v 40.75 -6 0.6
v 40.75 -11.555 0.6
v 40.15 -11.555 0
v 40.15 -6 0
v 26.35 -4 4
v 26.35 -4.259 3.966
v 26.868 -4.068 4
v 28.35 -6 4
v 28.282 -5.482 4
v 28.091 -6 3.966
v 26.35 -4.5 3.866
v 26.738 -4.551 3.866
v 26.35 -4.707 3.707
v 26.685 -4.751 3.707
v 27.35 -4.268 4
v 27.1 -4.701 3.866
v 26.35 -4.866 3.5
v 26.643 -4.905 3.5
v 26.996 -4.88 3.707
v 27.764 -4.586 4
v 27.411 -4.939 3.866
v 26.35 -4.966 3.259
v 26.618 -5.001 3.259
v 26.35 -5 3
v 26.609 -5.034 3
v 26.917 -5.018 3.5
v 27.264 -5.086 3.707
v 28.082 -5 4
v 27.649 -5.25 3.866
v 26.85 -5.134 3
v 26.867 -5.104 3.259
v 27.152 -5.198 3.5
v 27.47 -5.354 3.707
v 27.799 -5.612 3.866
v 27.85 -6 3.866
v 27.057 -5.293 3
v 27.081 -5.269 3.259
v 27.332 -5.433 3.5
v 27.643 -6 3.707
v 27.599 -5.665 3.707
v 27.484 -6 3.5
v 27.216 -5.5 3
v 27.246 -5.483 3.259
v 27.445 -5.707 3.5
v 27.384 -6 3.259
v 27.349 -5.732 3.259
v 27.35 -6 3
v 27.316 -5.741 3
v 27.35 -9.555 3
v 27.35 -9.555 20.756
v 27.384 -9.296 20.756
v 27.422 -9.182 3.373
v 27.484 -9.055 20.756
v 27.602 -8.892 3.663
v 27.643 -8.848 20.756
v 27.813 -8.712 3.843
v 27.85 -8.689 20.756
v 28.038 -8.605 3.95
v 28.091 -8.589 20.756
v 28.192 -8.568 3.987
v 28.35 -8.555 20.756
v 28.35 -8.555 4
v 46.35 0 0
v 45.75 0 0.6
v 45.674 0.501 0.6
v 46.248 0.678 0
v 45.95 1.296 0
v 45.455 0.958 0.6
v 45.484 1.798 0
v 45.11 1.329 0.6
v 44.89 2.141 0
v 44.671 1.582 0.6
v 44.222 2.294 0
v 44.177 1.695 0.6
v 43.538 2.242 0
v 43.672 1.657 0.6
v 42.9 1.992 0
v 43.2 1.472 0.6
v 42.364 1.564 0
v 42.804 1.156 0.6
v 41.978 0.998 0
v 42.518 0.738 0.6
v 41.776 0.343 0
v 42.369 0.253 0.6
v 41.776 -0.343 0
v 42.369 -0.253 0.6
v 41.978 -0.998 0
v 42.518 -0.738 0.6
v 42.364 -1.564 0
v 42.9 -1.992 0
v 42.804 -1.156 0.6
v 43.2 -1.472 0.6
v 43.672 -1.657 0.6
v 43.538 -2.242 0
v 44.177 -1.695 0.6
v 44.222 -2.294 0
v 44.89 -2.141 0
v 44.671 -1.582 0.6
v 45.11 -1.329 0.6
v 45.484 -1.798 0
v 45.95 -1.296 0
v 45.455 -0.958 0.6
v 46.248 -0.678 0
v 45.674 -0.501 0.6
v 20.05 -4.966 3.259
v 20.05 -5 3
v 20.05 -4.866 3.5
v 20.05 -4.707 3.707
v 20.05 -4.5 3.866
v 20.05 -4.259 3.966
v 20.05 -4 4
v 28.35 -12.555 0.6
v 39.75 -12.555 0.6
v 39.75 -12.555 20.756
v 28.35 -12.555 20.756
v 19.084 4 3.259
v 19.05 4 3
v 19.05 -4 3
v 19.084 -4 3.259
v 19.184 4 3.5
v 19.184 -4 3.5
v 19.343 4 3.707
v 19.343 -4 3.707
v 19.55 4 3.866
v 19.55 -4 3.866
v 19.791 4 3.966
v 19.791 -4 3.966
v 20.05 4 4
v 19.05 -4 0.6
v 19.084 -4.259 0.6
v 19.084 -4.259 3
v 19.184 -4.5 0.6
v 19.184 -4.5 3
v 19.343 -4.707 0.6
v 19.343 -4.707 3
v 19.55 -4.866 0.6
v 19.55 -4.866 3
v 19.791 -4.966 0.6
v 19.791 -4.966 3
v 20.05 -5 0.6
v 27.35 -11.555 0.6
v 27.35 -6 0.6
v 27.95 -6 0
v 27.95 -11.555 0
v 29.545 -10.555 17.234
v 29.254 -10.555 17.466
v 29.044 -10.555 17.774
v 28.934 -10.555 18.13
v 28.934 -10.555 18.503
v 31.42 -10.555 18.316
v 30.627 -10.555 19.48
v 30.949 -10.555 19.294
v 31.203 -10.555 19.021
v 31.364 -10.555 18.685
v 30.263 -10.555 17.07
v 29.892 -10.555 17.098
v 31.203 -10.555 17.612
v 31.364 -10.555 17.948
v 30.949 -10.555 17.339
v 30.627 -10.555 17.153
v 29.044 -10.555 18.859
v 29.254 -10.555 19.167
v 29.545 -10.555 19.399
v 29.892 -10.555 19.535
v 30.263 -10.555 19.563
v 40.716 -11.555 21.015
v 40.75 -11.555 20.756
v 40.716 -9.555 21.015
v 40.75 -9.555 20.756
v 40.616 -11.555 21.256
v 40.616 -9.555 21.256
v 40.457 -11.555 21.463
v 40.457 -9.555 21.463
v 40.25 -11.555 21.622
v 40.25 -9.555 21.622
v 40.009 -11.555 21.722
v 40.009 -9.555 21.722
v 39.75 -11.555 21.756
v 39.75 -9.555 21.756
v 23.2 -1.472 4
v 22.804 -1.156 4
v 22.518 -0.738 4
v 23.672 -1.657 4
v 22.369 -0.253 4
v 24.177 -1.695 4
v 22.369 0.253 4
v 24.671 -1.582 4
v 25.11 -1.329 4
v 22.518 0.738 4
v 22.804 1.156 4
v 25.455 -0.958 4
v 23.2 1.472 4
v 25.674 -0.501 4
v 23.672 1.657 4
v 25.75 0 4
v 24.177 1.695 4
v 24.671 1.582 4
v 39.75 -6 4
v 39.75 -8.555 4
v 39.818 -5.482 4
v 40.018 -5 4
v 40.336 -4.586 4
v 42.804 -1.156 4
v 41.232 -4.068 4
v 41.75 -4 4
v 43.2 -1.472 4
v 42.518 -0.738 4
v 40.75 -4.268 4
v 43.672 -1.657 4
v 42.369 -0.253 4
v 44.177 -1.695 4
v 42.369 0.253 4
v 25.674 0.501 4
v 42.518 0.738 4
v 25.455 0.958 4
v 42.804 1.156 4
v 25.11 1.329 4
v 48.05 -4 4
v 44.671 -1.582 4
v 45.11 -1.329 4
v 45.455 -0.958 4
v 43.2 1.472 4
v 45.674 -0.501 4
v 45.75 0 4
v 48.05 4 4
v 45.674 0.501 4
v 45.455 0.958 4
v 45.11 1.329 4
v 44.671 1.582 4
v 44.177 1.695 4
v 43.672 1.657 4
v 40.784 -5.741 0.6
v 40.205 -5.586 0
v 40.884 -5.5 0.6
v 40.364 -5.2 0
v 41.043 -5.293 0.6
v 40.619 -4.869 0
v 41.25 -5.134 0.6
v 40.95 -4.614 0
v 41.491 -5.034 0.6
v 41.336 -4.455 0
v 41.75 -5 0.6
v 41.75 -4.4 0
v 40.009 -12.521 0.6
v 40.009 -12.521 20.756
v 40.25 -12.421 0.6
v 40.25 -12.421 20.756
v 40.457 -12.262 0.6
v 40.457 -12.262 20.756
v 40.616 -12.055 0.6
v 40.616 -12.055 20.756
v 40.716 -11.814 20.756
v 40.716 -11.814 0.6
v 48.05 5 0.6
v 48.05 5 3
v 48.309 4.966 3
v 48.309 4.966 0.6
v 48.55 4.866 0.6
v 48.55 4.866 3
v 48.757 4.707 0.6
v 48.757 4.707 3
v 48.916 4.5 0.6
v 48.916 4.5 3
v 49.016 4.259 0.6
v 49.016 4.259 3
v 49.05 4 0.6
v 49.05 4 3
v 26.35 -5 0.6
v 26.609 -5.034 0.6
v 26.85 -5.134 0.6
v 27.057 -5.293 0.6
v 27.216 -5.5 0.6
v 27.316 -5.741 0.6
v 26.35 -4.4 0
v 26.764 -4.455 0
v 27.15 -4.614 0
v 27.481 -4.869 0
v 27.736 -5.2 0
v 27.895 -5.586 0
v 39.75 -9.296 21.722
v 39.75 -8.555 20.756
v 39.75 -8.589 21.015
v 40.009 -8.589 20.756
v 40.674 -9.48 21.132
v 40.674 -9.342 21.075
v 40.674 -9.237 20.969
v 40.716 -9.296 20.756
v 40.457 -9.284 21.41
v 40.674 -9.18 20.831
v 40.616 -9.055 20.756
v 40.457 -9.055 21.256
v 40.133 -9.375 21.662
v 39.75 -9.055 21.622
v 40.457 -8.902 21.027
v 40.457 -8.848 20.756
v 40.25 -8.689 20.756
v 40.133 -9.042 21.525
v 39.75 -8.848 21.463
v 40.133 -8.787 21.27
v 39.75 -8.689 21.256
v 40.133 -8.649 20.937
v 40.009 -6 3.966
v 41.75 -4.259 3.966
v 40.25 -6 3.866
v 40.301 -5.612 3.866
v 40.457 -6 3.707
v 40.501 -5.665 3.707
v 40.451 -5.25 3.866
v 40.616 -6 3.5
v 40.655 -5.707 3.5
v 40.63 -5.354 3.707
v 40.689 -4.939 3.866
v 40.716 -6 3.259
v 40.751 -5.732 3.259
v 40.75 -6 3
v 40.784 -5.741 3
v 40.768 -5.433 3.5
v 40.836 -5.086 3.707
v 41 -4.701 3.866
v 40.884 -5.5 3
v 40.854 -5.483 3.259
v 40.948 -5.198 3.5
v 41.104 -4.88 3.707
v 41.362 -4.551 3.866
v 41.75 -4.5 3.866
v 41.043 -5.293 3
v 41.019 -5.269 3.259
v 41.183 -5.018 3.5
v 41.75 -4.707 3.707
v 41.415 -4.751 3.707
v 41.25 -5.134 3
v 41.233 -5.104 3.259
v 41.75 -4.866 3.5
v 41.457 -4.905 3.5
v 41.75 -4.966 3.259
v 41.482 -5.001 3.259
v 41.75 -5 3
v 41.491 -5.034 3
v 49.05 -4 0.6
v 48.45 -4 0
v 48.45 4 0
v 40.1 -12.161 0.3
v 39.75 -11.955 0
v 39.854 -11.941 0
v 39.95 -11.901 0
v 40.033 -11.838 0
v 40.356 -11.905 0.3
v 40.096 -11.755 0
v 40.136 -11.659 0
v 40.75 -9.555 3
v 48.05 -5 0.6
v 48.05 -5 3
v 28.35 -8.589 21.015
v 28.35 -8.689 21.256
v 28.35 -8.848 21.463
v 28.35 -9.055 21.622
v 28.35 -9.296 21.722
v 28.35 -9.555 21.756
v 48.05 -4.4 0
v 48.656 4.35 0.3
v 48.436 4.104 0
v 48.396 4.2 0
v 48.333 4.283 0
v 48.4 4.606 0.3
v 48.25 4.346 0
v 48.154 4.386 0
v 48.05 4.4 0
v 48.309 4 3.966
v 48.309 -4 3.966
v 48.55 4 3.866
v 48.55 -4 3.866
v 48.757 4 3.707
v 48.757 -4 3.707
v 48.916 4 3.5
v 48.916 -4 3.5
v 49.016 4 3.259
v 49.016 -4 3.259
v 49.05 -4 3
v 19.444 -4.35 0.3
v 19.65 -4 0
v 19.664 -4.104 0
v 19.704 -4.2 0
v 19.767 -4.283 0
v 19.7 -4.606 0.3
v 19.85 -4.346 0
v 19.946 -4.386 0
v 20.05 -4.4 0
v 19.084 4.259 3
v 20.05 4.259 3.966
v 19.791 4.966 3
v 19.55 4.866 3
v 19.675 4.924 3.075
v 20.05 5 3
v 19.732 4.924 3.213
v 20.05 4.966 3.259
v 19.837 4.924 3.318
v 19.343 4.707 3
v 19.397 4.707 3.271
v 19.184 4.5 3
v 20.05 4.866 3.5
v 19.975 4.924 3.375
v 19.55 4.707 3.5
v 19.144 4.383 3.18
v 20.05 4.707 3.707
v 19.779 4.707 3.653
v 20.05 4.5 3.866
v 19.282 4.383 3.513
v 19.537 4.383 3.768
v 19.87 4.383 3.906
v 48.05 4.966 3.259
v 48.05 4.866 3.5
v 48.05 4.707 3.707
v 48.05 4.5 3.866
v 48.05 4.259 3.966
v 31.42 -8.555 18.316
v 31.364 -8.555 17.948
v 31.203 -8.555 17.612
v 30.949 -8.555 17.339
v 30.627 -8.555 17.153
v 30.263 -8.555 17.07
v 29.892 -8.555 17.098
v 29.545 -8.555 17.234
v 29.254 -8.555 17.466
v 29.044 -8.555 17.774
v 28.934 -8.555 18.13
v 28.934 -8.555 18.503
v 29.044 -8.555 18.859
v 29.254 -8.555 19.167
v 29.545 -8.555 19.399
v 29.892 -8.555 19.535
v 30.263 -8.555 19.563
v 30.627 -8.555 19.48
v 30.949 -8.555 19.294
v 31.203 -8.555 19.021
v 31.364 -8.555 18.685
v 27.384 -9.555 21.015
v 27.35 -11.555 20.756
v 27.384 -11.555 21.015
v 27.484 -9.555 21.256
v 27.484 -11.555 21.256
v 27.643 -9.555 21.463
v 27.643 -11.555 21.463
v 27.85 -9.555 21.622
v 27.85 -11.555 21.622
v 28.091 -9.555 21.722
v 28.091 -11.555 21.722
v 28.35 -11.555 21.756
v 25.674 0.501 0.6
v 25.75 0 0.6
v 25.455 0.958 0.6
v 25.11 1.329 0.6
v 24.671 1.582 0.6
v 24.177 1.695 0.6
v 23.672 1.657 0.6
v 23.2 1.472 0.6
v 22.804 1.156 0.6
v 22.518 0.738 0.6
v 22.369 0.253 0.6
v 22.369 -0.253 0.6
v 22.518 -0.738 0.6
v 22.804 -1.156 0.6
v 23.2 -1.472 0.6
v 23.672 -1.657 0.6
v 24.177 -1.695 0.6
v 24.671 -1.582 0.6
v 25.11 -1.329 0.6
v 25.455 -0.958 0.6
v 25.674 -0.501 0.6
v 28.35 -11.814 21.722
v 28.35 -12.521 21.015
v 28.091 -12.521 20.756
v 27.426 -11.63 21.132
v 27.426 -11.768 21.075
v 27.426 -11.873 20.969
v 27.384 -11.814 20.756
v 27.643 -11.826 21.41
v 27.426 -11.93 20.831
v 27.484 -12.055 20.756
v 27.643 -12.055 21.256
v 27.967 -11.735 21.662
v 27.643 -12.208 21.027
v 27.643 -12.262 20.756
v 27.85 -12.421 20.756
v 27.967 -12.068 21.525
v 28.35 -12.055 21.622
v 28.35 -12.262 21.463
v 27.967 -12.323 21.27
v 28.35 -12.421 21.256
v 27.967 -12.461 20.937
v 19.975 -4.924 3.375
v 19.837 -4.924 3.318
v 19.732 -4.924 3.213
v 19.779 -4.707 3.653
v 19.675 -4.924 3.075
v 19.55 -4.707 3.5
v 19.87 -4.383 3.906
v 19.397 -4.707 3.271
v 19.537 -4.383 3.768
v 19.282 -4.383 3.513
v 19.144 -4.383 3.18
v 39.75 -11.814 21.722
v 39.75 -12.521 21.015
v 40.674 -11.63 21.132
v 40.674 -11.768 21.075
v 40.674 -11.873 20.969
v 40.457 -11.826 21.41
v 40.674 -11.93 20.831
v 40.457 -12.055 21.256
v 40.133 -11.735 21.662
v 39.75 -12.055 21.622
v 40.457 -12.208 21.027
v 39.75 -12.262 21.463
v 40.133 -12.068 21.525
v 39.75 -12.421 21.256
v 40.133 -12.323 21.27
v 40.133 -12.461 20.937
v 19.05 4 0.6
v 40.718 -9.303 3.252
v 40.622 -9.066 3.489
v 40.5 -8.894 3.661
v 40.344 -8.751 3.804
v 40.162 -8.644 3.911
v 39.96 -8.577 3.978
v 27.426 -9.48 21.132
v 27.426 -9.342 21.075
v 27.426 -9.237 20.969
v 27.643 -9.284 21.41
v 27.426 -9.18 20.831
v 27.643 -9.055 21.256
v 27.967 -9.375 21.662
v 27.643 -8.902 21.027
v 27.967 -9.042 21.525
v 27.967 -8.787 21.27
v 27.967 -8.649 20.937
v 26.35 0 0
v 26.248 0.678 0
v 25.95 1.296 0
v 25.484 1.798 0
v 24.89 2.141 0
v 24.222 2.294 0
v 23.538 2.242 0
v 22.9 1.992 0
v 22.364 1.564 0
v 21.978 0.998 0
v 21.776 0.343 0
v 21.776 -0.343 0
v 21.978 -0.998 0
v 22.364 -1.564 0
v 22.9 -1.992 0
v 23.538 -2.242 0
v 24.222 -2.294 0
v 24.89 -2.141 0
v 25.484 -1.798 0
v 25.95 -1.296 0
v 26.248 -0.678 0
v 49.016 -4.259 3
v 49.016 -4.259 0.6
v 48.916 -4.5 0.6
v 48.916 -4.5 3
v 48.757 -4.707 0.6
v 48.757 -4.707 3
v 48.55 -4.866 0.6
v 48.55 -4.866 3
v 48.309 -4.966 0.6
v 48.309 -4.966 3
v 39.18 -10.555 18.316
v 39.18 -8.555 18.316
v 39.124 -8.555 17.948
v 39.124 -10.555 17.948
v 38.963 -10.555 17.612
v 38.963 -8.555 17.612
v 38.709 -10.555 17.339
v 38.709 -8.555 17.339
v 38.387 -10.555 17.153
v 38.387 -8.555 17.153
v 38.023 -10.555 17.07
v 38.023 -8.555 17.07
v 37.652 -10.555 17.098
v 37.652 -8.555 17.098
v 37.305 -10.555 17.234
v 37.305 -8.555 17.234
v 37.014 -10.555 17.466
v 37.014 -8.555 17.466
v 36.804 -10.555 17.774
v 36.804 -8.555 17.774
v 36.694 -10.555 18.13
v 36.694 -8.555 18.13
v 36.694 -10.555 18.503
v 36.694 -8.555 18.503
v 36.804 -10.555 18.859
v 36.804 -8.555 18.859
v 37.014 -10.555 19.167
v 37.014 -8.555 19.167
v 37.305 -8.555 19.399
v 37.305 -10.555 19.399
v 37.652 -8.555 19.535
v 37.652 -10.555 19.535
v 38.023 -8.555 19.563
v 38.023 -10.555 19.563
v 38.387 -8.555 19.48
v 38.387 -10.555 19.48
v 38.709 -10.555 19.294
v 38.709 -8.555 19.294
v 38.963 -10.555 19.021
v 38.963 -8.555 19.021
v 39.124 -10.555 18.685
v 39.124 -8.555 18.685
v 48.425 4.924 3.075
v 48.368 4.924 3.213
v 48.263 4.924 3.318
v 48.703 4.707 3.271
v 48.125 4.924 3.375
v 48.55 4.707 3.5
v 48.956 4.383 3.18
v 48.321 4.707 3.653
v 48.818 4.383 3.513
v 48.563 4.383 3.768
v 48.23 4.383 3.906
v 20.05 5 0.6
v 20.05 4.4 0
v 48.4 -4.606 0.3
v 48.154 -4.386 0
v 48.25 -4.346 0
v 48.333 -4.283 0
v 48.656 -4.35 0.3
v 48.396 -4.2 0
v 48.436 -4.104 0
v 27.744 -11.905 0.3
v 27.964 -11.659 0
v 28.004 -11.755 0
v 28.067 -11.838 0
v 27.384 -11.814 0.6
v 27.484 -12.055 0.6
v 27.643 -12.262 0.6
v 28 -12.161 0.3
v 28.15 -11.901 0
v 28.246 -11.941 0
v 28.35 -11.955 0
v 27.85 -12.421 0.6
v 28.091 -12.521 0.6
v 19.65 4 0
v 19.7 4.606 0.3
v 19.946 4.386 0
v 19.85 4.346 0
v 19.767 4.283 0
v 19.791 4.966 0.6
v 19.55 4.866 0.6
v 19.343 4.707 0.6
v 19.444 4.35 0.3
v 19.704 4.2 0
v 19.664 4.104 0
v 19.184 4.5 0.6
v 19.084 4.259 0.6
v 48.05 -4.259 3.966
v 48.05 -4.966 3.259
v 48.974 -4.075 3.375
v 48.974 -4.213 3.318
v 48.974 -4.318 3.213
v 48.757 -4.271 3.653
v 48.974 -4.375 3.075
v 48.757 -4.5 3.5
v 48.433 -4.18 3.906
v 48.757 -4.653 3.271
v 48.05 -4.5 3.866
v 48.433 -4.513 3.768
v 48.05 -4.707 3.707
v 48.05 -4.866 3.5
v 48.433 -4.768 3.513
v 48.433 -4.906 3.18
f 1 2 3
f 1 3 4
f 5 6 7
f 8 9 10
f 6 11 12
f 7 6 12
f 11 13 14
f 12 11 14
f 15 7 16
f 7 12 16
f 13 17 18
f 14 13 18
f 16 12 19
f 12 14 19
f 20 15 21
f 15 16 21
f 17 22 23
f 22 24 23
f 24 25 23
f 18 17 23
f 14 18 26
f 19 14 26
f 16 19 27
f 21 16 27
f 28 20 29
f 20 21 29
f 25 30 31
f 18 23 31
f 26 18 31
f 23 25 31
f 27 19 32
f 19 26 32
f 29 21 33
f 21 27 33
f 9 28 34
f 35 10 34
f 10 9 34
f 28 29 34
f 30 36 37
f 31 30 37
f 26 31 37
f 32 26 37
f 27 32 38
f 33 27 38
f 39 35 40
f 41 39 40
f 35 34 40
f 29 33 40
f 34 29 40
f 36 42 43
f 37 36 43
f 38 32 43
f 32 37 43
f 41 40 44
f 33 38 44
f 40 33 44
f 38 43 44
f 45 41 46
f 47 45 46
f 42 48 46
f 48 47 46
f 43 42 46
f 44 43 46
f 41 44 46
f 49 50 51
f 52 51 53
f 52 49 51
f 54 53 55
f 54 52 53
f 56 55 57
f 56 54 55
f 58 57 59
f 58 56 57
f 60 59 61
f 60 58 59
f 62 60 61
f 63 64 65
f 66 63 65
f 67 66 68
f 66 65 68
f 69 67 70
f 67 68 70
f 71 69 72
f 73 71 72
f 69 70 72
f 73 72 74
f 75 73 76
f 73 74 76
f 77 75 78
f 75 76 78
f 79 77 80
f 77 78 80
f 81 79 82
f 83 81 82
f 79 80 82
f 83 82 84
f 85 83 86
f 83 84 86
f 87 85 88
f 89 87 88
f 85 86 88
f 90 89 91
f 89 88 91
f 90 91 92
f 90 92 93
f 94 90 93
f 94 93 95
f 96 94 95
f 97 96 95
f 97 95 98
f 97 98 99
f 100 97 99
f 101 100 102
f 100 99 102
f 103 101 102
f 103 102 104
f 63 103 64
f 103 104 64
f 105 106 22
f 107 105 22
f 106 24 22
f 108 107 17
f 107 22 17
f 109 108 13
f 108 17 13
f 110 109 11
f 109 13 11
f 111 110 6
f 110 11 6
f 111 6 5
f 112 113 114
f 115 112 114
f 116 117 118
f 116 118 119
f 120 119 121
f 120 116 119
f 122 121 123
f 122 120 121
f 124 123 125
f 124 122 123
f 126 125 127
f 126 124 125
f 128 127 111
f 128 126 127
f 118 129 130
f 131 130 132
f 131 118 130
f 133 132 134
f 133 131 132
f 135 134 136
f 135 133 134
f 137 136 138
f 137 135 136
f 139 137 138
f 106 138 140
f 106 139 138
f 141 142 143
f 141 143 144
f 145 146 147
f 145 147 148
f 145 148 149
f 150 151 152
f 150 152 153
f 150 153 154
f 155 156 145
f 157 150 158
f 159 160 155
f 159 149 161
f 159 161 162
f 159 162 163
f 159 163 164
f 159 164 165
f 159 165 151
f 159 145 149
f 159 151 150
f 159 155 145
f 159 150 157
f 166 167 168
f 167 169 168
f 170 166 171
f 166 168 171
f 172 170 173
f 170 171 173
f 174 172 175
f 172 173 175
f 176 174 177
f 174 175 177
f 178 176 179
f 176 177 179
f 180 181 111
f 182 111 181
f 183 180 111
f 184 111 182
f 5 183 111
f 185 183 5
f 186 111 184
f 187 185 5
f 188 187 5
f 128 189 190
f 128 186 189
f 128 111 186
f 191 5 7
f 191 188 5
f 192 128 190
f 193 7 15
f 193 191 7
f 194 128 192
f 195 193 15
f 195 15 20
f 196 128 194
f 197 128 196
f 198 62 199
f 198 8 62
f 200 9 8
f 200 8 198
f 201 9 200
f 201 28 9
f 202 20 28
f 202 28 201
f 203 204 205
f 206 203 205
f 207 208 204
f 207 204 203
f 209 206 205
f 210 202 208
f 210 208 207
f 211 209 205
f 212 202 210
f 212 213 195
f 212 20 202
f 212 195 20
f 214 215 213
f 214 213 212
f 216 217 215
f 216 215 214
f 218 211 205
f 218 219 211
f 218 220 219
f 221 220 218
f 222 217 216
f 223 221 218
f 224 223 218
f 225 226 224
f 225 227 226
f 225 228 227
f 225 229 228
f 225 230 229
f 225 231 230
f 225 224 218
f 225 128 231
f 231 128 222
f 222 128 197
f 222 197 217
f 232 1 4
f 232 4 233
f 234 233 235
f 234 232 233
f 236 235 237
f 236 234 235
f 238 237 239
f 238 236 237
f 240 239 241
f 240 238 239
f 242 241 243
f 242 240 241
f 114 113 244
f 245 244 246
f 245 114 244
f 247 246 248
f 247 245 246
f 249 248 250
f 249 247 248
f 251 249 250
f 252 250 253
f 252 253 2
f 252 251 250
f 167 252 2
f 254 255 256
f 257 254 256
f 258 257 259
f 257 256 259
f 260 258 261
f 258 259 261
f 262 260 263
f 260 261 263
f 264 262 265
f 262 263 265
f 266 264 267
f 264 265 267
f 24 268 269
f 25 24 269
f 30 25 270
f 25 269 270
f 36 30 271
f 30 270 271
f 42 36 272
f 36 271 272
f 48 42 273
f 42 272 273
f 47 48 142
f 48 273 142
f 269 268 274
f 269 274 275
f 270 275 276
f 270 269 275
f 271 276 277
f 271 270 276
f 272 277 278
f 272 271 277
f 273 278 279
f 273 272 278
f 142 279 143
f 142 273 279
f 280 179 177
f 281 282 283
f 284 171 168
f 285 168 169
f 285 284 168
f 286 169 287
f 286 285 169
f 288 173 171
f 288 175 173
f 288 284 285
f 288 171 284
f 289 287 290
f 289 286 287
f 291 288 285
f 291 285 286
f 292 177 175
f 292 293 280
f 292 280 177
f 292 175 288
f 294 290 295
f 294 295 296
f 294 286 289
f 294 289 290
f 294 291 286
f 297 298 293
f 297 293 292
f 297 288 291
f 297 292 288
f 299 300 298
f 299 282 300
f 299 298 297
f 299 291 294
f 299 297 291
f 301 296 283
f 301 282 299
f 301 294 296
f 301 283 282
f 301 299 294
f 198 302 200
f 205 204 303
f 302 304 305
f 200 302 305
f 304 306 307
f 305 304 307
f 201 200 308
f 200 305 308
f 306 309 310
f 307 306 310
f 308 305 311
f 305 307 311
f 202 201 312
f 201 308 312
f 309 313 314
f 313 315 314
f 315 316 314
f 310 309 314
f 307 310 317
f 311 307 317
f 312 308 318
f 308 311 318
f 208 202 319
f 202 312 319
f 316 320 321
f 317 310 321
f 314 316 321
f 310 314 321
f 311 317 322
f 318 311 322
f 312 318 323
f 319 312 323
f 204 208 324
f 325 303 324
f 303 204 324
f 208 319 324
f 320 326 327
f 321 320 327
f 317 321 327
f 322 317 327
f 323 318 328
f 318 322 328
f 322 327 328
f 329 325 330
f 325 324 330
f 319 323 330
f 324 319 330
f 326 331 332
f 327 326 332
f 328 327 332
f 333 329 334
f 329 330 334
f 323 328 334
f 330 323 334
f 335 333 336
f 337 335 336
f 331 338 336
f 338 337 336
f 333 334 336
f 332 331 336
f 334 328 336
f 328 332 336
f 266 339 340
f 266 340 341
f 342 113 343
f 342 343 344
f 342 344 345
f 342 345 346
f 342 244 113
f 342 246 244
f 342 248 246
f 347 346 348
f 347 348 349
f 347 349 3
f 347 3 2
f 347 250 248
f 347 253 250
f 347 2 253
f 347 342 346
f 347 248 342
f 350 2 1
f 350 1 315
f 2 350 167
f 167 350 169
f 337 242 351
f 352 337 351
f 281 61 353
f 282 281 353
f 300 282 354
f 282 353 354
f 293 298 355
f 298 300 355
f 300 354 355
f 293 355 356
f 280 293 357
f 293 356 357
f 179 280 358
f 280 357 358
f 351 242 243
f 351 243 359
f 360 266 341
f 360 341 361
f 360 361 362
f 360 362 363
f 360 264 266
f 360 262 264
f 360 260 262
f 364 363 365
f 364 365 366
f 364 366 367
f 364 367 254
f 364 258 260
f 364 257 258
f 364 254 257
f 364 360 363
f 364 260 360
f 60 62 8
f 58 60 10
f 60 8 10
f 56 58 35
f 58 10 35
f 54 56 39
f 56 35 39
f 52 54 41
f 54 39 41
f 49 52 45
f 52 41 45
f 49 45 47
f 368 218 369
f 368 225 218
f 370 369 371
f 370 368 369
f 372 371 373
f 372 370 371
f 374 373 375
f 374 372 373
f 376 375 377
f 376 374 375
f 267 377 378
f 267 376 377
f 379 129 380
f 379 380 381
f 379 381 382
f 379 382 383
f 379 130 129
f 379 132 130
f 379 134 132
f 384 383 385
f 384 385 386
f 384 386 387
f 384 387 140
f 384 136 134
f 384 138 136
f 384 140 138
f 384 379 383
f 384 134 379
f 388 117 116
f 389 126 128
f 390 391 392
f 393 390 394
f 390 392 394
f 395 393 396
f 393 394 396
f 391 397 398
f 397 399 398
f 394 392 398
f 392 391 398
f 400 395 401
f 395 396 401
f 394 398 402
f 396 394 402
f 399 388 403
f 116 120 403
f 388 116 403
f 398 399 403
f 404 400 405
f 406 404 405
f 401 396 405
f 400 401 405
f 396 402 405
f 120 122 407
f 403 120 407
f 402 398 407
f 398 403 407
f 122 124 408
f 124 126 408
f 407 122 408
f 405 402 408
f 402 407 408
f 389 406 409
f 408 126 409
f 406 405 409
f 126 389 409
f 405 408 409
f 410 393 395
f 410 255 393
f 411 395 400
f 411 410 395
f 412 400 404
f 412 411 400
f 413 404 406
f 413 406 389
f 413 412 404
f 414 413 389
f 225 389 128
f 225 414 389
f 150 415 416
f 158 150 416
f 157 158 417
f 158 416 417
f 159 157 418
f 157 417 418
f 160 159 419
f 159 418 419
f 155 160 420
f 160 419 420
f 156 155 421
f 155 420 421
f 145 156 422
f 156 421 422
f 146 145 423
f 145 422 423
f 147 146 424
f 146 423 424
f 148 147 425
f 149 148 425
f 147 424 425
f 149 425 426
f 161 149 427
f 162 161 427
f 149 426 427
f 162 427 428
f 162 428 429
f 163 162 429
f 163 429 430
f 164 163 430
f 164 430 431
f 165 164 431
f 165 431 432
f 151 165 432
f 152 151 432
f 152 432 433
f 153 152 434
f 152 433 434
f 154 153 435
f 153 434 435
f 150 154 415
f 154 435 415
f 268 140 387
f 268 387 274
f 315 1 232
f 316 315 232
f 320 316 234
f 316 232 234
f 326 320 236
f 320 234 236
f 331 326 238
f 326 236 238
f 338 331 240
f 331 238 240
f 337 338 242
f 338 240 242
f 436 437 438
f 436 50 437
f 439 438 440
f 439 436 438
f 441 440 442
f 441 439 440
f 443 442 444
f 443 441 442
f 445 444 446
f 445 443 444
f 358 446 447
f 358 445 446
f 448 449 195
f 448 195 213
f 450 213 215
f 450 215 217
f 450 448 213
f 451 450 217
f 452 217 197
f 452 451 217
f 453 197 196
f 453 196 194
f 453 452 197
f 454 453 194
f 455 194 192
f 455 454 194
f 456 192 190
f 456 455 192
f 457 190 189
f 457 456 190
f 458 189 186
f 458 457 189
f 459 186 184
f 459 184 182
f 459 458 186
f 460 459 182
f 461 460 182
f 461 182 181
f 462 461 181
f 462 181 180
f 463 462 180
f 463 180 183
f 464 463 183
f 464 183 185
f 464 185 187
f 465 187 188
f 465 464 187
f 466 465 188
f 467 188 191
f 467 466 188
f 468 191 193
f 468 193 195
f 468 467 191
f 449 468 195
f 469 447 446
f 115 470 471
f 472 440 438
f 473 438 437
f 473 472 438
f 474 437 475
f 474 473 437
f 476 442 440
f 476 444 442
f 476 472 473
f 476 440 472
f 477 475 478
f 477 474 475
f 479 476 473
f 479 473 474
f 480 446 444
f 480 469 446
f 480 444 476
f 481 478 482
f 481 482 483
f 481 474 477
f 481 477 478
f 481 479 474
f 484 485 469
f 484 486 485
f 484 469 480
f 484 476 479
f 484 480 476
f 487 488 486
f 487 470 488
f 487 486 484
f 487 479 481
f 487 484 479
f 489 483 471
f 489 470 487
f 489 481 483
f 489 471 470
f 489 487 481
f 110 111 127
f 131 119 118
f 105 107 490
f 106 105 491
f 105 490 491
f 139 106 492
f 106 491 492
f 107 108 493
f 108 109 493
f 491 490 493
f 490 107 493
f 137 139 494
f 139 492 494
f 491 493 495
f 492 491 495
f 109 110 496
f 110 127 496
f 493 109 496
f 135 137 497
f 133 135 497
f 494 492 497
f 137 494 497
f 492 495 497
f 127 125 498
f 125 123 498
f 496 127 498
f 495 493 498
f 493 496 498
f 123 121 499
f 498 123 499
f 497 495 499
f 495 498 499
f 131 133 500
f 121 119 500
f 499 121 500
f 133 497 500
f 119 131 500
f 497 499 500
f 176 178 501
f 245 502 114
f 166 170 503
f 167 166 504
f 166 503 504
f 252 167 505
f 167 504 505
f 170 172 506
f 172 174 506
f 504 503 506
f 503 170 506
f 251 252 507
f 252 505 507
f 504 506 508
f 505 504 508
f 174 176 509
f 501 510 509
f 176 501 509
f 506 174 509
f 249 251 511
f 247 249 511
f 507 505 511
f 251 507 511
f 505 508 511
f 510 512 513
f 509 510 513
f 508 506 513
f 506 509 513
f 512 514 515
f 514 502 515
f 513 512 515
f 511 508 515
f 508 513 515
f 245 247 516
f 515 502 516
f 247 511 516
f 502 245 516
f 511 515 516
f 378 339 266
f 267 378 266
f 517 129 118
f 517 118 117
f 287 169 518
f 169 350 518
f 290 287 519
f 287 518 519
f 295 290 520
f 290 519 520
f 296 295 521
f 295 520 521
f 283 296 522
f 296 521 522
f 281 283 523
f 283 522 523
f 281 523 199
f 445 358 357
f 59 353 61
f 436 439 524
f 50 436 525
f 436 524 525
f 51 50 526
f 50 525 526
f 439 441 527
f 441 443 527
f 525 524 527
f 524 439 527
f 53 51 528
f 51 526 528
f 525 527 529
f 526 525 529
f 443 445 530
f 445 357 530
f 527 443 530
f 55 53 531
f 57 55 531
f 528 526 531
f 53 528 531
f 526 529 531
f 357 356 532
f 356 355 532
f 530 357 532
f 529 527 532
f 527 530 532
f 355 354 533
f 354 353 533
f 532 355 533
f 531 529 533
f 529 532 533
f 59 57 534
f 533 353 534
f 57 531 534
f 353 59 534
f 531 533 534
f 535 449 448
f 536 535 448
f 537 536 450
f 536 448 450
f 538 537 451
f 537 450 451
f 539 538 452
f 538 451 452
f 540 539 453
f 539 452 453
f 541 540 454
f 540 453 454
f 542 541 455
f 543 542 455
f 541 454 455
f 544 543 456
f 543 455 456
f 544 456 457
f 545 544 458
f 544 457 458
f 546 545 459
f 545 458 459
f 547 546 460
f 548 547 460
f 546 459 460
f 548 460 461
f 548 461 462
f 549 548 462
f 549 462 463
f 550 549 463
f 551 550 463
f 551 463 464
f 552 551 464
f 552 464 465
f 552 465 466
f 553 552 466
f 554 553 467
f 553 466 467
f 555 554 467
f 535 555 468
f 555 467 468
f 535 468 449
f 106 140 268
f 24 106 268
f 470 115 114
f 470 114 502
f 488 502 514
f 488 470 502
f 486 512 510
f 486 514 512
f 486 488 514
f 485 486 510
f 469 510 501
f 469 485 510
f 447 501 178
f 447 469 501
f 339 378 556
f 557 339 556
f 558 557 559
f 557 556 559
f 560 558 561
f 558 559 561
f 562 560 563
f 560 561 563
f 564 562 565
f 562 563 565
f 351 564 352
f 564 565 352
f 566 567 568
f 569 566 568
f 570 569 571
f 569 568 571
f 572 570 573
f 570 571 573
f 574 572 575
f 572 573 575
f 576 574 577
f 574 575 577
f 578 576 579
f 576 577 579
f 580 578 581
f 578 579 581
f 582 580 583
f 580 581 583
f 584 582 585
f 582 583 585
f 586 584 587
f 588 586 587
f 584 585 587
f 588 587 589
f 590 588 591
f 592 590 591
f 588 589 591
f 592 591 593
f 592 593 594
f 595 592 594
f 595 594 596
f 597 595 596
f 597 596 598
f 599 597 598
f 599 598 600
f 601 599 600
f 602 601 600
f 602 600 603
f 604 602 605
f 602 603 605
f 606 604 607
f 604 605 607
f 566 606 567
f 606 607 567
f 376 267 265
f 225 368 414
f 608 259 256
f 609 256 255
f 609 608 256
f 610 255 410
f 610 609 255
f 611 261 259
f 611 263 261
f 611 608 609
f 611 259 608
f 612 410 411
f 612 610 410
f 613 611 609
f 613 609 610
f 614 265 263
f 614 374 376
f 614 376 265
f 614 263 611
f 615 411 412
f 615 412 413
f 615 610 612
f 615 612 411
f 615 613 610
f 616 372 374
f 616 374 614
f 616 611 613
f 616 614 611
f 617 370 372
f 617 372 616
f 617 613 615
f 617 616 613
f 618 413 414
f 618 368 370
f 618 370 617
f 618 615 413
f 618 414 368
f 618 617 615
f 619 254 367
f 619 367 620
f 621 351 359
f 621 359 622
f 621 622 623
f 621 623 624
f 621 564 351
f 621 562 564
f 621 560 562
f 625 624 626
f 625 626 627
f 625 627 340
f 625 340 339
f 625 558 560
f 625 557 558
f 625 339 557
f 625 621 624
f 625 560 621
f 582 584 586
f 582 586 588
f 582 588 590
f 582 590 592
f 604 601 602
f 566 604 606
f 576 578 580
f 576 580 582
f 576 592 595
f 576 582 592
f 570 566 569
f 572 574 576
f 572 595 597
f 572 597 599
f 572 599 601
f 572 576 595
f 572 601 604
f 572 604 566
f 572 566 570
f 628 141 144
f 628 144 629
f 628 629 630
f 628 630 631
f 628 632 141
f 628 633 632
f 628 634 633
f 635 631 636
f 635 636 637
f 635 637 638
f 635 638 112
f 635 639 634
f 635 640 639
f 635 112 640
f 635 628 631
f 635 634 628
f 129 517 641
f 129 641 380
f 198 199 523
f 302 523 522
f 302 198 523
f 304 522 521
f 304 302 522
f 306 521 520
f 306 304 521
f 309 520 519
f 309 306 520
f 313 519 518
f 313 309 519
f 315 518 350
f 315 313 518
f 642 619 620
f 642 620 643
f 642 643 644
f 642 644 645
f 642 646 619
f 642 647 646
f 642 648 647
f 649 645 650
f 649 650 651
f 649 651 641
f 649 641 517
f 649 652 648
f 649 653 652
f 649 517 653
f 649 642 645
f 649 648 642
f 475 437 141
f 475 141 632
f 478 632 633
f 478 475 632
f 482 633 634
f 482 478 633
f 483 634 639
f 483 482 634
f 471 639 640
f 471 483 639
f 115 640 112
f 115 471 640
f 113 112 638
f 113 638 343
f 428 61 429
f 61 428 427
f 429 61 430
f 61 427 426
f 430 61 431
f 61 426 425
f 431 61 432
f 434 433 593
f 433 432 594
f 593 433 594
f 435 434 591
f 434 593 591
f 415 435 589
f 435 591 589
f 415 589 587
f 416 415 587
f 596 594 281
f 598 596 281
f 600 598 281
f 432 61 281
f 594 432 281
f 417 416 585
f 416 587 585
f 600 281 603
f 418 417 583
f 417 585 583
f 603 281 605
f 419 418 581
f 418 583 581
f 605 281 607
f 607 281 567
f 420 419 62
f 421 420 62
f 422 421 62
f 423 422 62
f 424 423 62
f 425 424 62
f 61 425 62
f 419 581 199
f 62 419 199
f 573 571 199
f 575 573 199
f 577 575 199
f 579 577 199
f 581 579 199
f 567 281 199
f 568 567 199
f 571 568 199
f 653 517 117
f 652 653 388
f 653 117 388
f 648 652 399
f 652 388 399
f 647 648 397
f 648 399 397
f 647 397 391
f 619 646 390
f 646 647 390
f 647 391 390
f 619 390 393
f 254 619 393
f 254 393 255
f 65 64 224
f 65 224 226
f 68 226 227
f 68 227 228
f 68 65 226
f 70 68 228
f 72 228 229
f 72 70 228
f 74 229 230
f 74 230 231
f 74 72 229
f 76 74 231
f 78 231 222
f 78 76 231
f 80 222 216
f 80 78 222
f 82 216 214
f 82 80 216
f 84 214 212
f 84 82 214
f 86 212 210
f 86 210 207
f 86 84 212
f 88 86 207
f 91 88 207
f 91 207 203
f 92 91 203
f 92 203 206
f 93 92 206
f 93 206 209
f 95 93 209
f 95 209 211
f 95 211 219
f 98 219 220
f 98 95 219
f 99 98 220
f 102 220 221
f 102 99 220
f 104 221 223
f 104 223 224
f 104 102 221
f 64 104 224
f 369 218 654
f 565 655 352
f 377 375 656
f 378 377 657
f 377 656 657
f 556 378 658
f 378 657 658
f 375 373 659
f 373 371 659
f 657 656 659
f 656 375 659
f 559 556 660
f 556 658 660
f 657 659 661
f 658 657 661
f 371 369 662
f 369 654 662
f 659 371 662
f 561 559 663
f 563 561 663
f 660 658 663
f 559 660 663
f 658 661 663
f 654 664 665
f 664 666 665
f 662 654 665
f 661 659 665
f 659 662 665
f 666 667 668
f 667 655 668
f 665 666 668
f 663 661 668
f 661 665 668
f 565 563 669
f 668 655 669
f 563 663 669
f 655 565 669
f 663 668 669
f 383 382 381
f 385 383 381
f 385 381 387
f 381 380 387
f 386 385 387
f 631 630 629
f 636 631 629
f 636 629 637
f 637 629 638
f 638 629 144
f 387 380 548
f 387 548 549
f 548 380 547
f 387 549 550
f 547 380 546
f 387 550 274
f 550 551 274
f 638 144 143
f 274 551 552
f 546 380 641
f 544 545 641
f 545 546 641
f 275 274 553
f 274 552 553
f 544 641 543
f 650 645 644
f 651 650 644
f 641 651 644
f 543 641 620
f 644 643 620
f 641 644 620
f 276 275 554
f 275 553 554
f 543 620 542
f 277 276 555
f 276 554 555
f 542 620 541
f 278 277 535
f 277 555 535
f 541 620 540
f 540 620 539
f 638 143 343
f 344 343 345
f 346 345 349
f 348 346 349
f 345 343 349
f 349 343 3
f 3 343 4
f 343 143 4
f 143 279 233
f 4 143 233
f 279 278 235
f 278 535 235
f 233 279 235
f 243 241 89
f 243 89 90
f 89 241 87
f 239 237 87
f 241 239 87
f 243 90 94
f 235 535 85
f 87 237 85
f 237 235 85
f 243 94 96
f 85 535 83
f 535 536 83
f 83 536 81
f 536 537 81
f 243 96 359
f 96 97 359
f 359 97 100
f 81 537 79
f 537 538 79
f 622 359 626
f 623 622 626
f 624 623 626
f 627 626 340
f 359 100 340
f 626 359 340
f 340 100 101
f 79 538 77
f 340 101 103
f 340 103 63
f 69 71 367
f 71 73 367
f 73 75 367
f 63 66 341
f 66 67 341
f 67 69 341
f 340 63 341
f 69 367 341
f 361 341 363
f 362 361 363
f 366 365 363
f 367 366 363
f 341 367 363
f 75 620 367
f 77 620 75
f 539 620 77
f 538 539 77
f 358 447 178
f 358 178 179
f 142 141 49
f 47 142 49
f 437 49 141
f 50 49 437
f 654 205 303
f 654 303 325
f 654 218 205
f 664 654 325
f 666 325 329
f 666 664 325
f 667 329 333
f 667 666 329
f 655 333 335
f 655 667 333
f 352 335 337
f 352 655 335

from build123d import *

# Parameters (mm, degrees)
SKETCH1_W           = 30
SKETCH1_H           = 10
SKETCH1_R           = 1.7
BOSS_EXTRUDE1_DEPTH = 4
BOSS_EXTRUDE2_START = -13.4
BOSS_EXTRUDE2_DEPTH = 13.4
SKETCH3_R           = 1.25
CUT_EXTRUDE1_DEPTH  = 2
FILLET1_R           = 1
CHAMFER1_SIZE       = 0.6


with BuildPart() as part:
    # Sketch1 → Boss-Extrude1 (new body)
    with BuildSketch(Plane.XY):
        with Locations((34.05, 0)):
            Rectangle(SKETCH1_W, SKETCH1_H)
        with Locations((44.05, 0)):
            Circle(SKETCH1_R, mode=Mode.SUBTRACT)
        with Locations((24.05, 0)):
            Circle(SKETCH1_R, mode=Mode.SUBTRACT)
    extrude(amount=BOSS_EXTRUDE1_DEPTH)

    # Sketch2 → Boss-Extrude2 (add)
    with BuildSketch(Plane.ZY.offset(-27.35).offset(BOSS_EXTRUDE2_START)):
        Polygon((21.756367983, -8.555), (4, -8.555), (4, -5), (0, -5), (0, -12.555), (21.756367983, -12.555), align=None)
    extrude(amount=BOSS_EXTRUDE2_DEPTH)

    # Sketch3 → Cut-Extrude1 (cut)
    with BuildSketch(Plane(origin=(0, -8.555, 0), x_dir=(1, 0, 0), z_dir=(0, 1, 0))):
        with Locations((30.17, -18.316367983)):
            Circle(SKETCH3_R)
        with Locations((37.93, -18.316367983)):
            Circle(SKETCH3_R)
    extrude(amount=-CUT_EXTRUDE1_DEPTH, mode=Mode.SUBTRACT)

    # Fillet1
    fillet1_edges = [part.edges().sort_by_distance(p)[0] for p in [
        (19.05, 0, 4),
        (23.2, -5, 4),
        (44.9, -5, 4),
        (34.05, -8.555, 21.756367983),
        (34.05, -12.555, 21.756367983),
        (27.35, -10.555, 21.756367983),
        (27.35, -8.555, 12.878183991),
        (27.35, -6.7775, 4),
        (27.35, -5, 2),
        (27.35, -12.555, 10.878183991),
        (40.75, -10.555, 21.756367983),
        (40.75, -12.555, 10.878183991),
        (40.75, -5, 2),
        (40.75, -6.7775, 4),
        (40.75, -8.555, 12.878183991),
        (49.05, 0, 4),
        (49.05, -5, 2),
        (19.05, -5, 2),
        (19.05, 5, 2),
        (49.05, 5, 2),
        (34.05, 5, 4),
    ]]
    fillet(fillet1_edges, radius=FILLET1_R)

    # Chamfer1
    chamfer1_edges = [part.edges().sort_by_distance(p)[0] for p in [
        (42.35, 0, 0),
        (22.35, 0, 0),
        (23.2, -5, 0),
        (40.75, -8.7775, 0),
        (19.05, 0, 0),
        (27.35, -8.7775, 0),
        (34.05, 5, 0),
        (49.05, 0, 0),
        (44.9, -5, 0),
        (34.05, -12.555, 0),
        (19.342893219, -4.707106781, 0),
        (19.342893219, 4.707106781, 0),
        (48.757106781, 4.707106781, 0),
        (48.757106781, -4.707106781, 0),
        (40.457106781, -12.262106781, 0),
        (27.642893219, -12.262106781, 0),
        (41.042893219, -5.292893219, 0),
        (27.057106781, -5.292893219, 0),
    ]]
    chamfer(chamfer1_edges, length=CHAMFER1_SIZE)


solid = part.part
